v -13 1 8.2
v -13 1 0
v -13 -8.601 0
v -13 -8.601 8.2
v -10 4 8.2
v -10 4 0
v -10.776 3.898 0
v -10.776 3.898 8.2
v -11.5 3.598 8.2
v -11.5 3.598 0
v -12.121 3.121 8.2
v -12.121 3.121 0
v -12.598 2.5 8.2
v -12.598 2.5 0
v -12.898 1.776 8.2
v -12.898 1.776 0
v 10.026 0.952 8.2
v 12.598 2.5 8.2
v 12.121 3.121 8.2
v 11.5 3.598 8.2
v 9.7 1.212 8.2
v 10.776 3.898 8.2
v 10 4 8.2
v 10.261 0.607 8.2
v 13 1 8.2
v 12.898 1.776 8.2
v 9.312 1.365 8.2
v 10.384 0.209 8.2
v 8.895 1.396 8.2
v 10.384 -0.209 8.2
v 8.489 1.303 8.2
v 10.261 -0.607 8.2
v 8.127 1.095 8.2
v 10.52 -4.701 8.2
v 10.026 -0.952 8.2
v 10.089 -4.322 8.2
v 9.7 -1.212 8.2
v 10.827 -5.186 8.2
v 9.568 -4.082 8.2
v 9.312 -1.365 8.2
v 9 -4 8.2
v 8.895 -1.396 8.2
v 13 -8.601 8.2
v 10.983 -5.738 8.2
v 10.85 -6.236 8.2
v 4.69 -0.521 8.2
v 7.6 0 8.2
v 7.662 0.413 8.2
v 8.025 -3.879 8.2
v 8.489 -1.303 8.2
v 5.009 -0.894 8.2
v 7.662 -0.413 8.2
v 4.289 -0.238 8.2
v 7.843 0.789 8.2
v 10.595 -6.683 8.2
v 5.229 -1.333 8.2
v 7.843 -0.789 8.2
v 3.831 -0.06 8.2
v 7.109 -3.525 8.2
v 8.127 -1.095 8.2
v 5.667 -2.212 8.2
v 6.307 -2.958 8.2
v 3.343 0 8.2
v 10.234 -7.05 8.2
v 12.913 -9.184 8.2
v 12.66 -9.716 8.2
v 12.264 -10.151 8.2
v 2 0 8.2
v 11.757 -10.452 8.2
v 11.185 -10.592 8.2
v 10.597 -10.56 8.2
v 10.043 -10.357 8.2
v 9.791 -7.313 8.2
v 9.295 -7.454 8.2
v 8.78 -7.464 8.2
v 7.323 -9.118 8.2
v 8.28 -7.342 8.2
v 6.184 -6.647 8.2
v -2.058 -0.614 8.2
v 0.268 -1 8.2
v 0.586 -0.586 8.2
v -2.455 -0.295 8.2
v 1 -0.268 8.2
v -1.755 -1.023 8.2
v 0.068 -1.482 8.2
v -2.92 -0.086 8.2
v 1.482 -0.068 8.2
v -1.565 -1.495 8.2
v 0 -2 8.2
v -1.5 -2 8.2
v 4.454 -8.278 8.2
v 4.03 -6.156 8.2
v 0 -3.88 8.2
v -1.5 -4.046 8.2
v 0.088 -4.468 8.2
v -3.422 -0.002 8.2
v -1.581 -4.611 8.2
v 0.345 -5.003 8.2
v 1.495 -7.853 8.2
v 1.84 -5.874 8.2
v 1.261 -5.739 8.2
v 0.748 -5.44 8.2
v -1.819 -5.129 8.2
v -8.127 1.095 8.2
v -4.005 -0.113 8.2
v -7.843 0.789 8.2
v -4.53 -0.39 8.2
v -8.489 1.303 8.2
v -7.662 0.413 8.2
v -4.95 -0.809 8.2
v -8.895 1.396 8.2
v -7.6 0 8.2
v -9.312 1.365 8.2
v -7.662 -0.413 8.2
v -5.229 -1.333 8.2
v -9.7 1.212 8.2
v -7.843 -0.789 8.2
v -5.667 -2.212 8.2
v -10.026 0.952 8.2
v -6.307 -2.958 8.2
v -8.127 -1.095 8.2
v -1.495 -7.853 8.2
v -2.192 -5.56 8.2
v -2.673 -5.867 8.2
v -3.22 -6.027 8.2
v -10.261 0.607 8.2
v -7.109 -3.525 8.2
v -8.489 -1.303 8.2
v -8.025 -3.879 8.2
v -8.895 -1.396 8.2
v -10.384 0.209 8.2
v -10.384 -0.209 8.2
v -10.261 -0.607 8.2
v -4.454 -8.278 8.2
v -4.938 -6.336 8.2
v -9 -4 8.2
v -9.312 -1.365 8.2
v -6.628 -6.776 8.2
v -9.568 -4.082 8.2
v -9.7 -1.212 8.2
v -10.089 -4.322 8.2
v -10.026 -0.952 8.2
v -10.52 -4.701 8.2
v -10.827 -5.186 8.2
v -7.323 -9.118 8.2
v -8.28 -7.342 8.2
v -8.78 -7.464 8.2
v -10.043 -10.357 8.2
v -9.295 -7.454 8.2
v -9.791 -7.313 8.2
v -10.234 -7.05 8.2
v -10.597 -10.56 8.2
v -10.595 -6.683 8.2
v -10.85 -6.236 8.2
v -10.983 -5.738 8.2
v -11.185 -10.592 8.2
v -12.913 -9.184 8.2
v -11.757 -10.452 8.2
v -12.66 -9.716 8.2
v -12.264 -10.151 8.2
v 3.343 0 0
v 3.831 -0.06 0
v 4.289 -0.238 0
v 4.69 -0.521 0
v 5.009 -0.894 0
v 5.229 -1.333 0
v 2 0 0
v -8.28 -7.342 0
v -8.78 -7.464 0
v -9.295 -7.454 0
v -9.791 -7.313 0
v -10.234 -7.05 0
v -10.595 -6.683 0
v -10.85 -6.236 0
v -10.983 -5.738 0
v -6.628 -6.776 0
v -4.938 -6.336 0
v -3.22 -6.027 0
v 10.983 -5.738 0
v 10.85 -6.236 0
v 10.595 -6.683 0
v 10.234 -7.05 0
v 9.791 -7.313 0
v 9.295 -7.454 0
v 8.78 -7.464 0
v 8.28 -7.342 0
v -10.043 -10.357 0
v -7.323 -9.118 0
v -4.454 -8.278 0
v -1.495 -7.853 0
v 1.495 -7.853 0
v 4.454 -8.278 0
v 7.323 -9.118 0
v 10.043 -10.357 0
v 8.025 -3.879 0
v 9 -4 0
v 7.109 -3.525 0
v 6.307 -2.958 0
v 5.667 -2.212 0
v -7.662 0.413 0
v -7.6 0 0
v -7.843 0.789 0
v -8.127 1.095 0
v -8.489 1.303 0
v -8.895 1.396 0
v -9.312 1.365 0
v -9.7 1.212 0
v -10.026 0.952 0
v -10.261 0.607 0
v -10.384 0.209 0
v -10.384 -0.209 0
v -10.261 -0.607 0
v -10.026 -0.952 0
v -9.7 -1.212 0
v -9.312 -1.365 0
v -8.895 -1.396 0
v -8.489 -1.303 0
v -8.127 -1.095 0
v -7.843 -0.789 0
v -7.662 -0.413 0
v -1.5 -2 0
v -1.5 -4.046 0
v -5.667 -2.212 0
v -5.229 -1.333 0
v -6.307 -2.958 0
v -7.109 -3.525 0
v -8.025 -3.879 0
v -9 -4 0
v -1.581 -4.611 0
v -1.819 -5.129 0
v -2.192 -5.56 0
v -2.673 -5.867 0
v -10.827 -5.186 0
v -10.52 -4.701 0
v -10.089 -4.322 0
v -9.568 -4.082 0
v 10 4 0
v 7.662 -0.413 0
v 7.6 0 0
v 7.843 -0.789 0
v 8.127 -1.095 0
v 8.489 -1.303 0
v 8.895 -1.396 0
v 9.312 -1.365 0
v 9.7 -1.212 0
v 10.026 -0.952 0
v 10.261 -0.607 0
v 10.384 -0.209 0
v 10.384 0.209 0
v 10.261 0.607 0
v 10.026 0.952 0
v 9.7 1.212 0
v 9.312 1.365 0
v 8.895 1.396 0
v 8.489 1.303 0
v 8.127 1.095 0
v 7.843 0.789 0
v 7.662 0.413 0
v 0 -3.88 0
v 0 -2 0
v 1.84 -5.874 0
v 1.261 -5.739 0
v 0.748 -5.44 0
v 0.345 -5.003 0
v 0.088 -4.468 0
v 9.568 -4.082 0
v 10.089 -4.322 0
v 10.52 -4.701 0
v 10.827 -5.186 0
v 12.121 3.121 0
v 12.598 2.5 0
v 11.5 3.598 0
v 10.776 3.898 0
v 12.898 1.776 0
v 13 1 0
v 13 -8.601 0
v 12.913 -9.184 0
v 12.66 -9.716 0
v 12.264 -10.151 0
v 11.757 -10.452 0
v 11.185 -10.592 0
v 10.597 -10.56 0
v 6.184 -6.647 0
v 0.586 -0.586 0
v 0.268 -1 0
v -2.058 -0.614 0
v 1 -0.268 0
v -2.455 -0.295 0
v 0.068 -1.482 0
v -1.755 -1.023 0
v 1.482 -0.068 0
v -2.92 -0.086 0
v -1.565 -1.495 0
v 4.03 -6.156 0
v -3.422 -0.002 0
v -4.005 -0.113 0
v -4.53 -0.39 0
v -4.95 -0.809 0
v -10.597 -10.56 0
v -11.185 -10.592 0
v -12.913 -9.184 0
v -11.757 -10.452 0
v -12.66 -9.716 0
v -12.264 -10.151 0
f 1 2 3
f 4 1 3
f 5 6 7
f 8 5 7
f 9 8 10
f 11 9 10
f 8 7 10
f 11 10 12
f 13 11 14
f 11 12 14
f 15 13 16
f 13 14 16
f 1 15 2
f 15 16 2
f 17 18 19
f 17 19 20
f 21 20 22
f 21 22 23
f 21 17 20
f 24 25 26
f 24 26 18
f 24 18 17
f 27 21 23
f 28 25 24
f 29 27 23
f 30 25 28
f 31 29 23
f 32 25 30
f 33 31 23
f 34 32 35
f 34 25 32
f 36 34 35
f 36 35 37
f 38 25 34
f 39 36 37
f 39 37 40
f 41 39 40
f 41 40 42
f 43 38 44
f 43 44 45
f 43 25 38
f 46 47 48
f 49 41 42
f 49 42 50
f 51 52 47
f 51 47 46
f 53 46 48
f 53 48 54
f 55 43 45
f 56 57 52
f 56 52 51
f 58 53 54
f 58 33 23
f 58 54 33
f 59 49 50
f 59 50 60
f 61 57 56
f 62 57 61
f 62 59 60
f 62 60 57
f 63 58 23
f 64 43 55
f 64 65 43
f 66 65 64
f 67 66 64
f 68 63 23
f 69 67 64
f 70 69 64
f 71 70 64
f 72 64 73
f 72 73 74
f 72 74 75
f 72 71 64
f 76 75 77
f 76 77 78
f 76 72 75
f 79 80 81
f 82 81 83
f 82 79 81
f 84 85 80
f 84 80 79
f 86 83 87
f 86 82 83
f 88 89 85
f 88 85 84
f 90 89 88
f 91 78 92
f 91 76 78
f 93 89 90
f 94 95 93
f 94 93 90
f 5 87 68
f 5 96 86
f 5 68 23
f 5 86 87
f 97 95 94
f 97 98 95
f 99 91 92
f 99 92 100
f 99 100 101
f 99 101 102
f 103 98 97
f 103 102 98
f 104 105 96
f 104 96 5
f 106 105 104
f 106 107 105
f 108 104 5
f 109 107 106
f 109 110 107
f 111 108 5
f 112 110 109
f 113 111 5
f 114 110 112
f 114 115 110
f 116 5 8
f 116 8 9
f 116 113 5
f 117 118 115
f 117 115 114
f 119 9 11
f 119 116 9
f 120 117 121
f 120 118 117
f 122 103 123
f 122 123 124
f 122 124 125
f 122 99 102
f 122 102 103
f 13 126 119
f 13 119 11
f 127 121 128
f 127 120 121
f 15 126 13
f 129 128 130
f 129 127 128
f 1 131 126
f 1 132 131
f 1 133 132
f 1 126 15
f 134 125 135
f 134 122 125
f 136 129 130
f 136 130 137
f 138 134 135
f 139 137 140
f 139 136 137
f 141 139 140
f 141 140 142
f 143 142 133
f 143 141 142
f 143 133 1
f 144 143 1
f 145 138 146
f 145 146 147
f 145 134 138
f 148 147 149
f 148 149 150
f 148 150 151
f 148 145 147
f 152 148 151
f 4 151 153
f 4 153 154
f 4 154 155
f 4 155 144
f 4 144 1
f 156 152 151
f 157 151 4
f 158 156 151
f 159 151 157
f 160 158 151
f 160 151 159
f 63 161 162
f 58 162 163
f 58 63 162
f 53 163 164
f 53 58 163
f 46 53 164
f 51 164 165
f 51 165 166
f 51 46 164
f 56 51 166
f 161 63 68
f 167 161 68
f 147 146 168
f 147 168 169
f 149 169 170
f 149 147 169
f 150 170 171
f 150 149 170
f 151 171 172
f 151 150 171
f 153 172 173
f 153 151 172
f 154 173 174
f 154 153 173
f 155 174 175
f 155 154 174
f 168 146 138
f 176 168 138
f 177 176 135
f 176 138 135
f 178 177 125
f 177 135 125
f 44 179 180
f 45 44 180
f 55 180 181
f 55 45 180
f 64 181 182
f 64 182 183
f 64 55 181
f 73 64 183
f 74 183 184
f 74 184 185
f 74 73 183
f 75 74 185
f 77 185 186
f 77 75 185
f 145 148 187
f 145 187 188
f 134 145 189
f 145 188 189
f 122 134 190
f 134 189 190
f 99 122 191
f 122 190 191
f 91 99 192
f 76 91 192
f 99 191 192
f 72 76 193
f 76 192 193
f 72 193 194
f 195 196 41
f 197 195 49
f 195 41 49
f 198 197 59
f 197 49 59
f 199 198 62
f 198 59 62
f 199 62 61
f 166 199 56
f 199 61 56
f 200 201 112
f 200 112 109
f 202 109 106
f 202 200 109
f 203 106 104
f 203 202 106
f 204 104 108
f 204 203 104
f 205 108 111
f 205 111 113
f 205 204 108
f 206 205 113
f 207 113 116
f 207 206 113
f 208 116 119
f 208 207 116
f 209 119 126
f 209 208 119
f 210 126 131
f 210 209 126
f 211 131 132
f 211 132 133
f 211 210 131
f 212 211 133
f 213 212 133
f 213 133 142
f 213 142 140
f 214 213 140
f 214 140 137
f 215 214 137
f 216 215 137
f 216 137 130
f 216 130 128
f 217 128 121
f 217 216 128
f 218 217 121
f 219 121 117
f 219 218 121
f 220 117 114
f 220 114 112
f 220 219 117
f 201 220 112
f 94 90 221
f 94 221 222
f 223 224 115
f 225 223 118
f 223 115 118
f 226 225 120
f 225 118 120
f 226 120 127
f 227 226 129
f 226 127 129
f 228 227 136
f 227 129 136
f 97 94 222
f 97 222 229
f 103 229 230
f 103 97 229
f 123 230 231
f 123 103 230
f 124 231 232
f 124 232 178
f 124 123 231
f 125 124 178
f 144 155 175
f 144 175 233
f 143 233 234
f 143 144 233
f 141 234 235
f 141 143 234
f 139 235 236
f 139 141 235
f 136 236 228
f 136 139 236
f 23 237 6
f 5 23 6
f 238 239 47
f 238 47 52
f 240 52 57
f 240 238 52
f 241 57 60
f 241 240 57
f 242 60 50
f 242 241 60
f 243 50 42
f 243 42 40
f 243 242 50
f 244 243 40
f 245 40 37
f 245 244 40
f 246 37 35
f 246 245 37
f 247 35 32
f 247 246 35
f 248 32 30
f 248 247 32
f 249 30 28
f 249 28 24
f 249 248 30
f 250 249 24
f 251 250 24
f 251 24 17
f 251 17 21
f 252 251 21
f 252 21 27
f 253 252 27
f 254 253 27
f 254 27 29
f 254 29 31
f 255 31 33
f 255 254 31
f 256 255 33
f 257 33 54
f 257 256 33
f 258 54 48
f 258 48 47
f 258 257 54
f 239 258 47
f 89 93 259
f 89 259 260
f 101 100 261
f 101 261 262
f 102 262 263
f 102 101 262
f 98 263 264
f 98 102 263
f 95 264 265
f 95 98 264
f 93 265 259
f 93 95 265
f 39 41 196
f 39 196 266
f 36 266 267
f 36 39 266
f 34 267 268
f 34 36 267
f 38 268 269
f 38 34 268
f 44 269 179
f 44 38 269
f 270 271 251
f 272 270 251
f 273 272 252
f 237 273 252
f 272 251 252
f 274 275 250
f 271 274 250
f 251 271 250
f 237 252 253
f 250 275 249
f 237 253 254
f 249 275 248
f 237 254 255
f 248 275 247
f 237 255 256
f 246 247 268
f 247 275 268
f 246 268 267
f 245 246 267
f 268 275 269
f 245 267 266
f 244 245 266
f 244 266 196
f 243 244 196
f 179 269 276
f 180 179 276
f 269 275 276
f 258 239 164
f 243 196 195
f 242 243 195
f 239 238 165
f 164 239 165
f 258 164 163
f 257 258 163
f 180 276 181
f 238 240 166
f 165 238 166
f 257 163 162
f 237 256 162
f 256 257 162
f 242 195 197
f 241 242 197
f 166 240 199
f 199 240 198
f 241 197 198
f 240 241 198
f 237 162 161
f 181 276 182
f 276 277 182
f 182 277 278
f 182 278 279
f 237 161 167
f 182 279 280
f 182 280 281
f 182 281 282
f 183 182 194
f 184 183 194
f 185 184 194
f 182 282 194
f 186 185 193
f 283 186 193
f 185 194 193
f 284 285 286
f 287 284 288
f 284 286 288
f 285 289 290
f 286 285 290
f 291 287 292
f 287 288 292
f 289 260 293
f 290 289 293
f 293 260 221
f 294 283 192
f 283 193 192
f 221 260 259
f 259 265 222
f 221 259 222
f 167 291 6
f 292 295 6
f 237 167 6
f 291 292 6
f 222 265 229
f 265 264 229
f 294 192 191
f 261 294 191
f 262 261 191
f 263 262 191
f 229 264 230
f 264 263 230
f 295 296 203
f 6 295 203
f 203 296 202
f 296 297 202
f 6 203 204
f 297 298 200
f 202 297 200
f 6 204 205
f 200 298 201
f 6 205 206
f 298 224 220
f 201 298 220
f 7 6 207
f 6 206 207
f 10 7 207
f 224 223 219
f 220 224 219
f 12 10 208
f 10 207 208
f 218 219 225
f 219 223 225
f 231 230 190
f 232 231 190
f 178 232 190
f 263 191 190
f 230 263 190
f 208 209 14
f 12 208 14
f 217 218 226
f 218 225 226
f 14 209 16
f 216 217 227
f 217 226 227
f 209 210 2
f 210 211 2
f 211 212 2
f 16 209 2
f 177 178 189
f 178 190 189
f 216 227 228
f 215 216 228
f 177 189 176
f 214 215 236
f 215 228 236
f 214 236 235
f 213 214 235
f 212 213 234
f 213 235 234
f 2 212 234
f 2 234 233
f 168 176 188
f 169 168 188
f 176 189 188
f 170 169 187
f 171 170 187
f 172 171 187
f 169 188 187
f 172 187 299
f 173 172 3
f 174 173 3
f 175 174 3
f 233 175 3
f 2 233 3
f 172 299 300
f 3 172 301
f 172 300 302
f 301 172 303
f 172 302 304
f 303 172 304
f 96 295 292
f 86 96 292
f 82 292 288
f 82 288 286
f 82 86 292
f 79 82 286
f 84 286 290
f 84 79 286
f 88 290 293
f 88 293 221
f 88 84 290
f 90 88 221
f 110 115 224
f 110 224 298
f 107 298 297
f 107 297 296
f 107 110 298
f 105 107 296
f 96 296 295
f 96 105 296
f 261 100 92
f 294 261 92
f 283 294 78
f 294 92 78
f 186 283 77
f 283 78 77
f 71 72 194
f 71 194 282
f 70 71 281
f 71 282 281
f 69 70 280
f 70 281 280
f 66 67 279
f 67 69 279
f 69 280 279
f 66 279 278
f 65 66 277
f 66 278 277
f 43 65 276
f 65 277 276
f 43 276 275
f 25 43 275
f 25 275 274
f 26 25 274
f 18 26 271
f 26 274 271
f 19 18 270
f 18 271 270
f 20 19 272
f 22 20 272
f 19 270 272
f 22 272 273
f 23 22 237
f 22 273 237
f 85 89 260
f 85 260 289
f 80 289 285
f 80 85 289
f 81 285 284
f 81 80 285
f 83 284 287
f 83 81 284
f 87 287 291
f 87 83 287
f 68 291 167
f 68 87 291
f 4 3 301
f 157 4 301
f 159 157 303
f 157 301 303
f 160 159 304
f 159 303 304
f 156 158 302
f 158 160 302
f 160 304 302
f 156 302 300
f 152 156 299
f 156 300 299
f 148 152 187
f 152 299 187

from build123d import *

# Parameters (mm, degrees)
SKETCH_1_R          = 1.4
EXTRUDE_1_DEPTH     = 8.2
CUT_EXTRUDE_1_DEPTH = 10
EXTRUDE_2_DEPTH     = 8.2
FILLET_1_R          = 2


with BuildPart() as part:
    # 草图1 → 凸台-拉伸1 (new body)
    with BuildSketch(Plane.XY):
        with BuildLine():
            Line((-13, 1), (-13, -12.307577498))
            ThreePointArc((-13, -12.307577498), (0, -7.8), (13, -12.307577498))
            Line((13, -12.307577498), (13, 1))
            ThreePointArc((13, 1), (12.121320344, 3.121320344), (10, 4))
            Line((10, 4), (-10, 4))
            ThreePointArc((-10, 4), (-12.121320344, 3.121320344), (-13, 1))
        make_face()
        with Locations((-9, 0)):
            Circle(SKETCH_1_R, mode=Mode.SUBTRACT)
        with Locations(Location((9, 0, 0), (0, 0, 180))):
            Circle(SKETCH_1_R, mode=Mode.SUBTRACT)
    extrude(amount=EXTRUDE_1_DEPTH)

    # 草图2 → 切除-拉伸1 (cut)
    with BuildSketch(Plane.XY.offset(8.2)):
        with BuildLine():
            ThreePointArc((-5, 0), (-7, -3.464101615), (-11, -3.464101615))
            Line((-11, -3.464101615), (-11, -8.600990123))
            ThreePointArc((-11, -8.600990123), (0, -5.8), (11, -8.600990123))
            Line((11, -8.600990123), (11, -3.464101615))
            ThreePointArc((11, -3.464101615), (7, -3.464101615), (5, 0))
            Line((5, 0), (-5, 0))
        make_face()
    extrude(amount=-CUT_EXTRUDE_1_DEPTH, mode=Mode.SUBTRACT)

    # 草图3 → 凸台-拉伸2 (add)
    with BuildSketch(Plane.XY.offset(8.2)):
        with BuildLine():
            Line((0, -5.8), (0, 0))
            Line((0, 0), (-1.5, 0))
            Line((-1.5, 0), (-1.5, -5.848965165))
            ThreePointArc((-1.5, -5.848965165), (-0.750399492, -5.812244551), (0, -5.8))
        make_face()
    extrude(amount=-EXTRUDE_2_DEPTH)

    # 圆角1
    # the kernel refuses this fillet: 2 mm, written as the material it adds along each edge
    with BuildSketch(Plane(origin=(-11, -8.600990123, 8.2), x_dir=(0, 1, 0), z_dir=(0, 0, -1))) as fillet_1_piece_1:
        with BuildLine():
            CenterArc((3.124797703, 2), FILLET_1_R, 158.899803976, 111.100196024)
            ThreePointArc((1.258893096, 2.72), (0.673800117, 1.339471911), (0, 0))
            Line((0, 0), (3.124797703, 0))
        make_face()
    extrude(amount=8.2)
    with BuildSketch(Plane(origin=(-11, -3.464101615, 8.2), x_dir=(0.9659258262890684, -0.2588190451025207, 0), z_dir=(0, 0, -1))) as fillet_1_piece_2:
        with BuildLine():
            CenterArc((2.588190451, 1.931851653), FILLET_1_R, 165, 90)
            Line((0.656338798, 2.449489743), (0, 0))
            ThreePointArc((0, 0), (1.03527618, 0.136296695), (2.070552361, 0))
        make_face()
    extrude(amount=8.2)
    with BuildSketch(Plane(origin=(-5, 0, 8.2), x_dir=(1, 0, 0), z_dir=(0, 0, -1))) as fillet_1_piece_3:
        with BuildLine():
            CenterArc((1.656854249, 2), FILLET_1_R, 199.471220634, 70.528779366)
            ThreePointArc((-0.228763834, 1.333333333), (-0.057605761, 0.676407915), (0, 0))
            Line((0, 0), (1.656854249, 0))
        make_face()
    extrude(amount=8.2)
    with BuildSketch(Plane(origin=(11, -3.464101615, 8.2), x_dir=(0, -1, 0), z_dir=(0, 0, -1))) as fillet_1_piece_4:
        with BuildLine():
            CenterArc((2.535898385, 2), FILLET_1_R, 180, 90)
            ThreePointArc((0.535898385, 2), (0.39960169, 0.96472382), (0, 0))
            Line((0, 0), (2.535898385, 0))
        make_face()
    extrude(amount=8.2)
    with BuildSketch(Plane(origin=(11, -8.600990123, 8.2), x_dir=(-0.9075134779972225, 0.42002296038833975, 0), z_dir=(0, 0, -1))) as fillet_1_piece_5:
        with BuildLine():
            CenterArc((3.127513738, 1.99575011), FILLET_1_R, 155.163962917, 111.100196024)
            Line((1.312486782, 2.835796031), (0, 0))
            ThreePointArc((0, 0), (1.498600333, 0.04887373), (2.997200665, 0))
        make_face()
    extrude(amount=8.2)
    with BuildSketch(Plane(origin=(5, 0, 8.2), x_dir=(-1, 0, 0), z_dir=(0, 0, -1))) as fillet_1_piece_6:
        with BuildLine():
            CenterArc((1.656854249, -2), FILLET_1_R, 90, 70.528779366)
            ThreePointArc((-0.228763834, -1.333333333), (-0.057605761, -0.676407915), (0, 0))
            Line((0, 0), (1.656854249, 0))
        make_face()
    extrude(amount=8.2)
    with BuildSketch(Plane(origin=(-1.5, 0, 8.2), x_dir=(-1, 0, 0), z_dir=(0, 0, -1))) as fillet_1_piece_7:
        with BuildLine():
            CenterArc((FILLET_1_R, -FILLET_1_R), FILLET_1_R, 90, 90)
            Line((0, -FILLET_1_R), (0, 0))
            Line((0, 0), (FILLET_1_R, 0))
        make_face()
    extrude(amount=8.2)
    with BuildSketch(Plane(origin=(-1.5, -5.848965165, 8.2), x_dir=(-0.994714309544396, -0.10268126600123115, 0), z_dir=(0, 0, -1))) as fillet_1_piece_8:
        with BuildLine():
            CenterArc((1.804319684, 1.998586493), FILLET_1_R, 185.893590739, 81.952153753)
            Line((-0.185108935, 1.793223961), (0, 0))
            ThreePointArc((0, 0), (0.864569849, 0.016255332), (1.729139697, 0))
        make_face()
    extrude(amount=8.2)
    with BuildSketch(Plane(origin=(0, -5.8, 8.2), x_dir=(0.9991983946019533, -0.04003208993893798, 0), z_dir=(0, 0, -1))) as fillet_1_piece_9:
        with BuildLine():
            CenterArc((1.921540317, -1.998396789), FILLET_1_R, 92.294282868, 85.411434264)
            Line((-0.076856472, -1.918332609), (0, 0))
            ThreePointArc((0, 0), (0.920738069, -0.018436924), (1.841476137, 0))
        make_face()
    extrude(amount=8.2)
    with BuildSketch(Plane(origin=(0, 0, 8.2), x_dir=(1, 0, 0), z_dir=(0, 0, -1))) as fillet_1_piece_10:
        with BuildLine():
            CenterArc((FILLET_1_R, FILLET_1_R), FILLET_1_R, 180, 90)
            Line((0, FILLET_1_R), (0, 0))
            Line((0, 0), (FILLET_1_R, 0))
        make_face()
    extrude(amount=8.2)
    # the kernel refuses this fillet: 2 mm, written as the material it takes off along each edge
    with BuildSketch(Plane(origin=(13, -12.307577498, -9.266468436), x_dir=(-0.8347589906571732, 0.5506154987984059, 0), z_dir=(0, 0, 1))) as fillet_1_2_piece_1:
        with BuildLine():
            CenterArc((3.710422437, -1.992876138), FILLET_1_R, 94.837370868, 118.571878142)
            Line((2.040904456, -3.094107135), (0, 0))
            ThreePointArc((0, 0), (1.770883436, -0.074800554), (3.541766872, 0))
        make_face()
    extrude(amount=26.732936871, mode=Mode.SUBTRACT)
    with BuildSketch(Plane(origin=(-13, -12.307577498, -9.266468436), x_dir=(0, 1, 0), z_dir=(0, 0, 1))) as fillet_1_2_piece_2:
        with BuildLine():
            CenterArc((3.706587374, -2), FILLET_1_R, 90, 118.571878142)
            ThreePointArc((1.950151733, -2.956521739), (1.037516301, -1.437074525), (0, 0))
            Line((0, 0), (3.706587374, 0))
        make_face()
    extrude(amount=26.732936871, mode=Mode.SUBTRACT)


solid = part.part
